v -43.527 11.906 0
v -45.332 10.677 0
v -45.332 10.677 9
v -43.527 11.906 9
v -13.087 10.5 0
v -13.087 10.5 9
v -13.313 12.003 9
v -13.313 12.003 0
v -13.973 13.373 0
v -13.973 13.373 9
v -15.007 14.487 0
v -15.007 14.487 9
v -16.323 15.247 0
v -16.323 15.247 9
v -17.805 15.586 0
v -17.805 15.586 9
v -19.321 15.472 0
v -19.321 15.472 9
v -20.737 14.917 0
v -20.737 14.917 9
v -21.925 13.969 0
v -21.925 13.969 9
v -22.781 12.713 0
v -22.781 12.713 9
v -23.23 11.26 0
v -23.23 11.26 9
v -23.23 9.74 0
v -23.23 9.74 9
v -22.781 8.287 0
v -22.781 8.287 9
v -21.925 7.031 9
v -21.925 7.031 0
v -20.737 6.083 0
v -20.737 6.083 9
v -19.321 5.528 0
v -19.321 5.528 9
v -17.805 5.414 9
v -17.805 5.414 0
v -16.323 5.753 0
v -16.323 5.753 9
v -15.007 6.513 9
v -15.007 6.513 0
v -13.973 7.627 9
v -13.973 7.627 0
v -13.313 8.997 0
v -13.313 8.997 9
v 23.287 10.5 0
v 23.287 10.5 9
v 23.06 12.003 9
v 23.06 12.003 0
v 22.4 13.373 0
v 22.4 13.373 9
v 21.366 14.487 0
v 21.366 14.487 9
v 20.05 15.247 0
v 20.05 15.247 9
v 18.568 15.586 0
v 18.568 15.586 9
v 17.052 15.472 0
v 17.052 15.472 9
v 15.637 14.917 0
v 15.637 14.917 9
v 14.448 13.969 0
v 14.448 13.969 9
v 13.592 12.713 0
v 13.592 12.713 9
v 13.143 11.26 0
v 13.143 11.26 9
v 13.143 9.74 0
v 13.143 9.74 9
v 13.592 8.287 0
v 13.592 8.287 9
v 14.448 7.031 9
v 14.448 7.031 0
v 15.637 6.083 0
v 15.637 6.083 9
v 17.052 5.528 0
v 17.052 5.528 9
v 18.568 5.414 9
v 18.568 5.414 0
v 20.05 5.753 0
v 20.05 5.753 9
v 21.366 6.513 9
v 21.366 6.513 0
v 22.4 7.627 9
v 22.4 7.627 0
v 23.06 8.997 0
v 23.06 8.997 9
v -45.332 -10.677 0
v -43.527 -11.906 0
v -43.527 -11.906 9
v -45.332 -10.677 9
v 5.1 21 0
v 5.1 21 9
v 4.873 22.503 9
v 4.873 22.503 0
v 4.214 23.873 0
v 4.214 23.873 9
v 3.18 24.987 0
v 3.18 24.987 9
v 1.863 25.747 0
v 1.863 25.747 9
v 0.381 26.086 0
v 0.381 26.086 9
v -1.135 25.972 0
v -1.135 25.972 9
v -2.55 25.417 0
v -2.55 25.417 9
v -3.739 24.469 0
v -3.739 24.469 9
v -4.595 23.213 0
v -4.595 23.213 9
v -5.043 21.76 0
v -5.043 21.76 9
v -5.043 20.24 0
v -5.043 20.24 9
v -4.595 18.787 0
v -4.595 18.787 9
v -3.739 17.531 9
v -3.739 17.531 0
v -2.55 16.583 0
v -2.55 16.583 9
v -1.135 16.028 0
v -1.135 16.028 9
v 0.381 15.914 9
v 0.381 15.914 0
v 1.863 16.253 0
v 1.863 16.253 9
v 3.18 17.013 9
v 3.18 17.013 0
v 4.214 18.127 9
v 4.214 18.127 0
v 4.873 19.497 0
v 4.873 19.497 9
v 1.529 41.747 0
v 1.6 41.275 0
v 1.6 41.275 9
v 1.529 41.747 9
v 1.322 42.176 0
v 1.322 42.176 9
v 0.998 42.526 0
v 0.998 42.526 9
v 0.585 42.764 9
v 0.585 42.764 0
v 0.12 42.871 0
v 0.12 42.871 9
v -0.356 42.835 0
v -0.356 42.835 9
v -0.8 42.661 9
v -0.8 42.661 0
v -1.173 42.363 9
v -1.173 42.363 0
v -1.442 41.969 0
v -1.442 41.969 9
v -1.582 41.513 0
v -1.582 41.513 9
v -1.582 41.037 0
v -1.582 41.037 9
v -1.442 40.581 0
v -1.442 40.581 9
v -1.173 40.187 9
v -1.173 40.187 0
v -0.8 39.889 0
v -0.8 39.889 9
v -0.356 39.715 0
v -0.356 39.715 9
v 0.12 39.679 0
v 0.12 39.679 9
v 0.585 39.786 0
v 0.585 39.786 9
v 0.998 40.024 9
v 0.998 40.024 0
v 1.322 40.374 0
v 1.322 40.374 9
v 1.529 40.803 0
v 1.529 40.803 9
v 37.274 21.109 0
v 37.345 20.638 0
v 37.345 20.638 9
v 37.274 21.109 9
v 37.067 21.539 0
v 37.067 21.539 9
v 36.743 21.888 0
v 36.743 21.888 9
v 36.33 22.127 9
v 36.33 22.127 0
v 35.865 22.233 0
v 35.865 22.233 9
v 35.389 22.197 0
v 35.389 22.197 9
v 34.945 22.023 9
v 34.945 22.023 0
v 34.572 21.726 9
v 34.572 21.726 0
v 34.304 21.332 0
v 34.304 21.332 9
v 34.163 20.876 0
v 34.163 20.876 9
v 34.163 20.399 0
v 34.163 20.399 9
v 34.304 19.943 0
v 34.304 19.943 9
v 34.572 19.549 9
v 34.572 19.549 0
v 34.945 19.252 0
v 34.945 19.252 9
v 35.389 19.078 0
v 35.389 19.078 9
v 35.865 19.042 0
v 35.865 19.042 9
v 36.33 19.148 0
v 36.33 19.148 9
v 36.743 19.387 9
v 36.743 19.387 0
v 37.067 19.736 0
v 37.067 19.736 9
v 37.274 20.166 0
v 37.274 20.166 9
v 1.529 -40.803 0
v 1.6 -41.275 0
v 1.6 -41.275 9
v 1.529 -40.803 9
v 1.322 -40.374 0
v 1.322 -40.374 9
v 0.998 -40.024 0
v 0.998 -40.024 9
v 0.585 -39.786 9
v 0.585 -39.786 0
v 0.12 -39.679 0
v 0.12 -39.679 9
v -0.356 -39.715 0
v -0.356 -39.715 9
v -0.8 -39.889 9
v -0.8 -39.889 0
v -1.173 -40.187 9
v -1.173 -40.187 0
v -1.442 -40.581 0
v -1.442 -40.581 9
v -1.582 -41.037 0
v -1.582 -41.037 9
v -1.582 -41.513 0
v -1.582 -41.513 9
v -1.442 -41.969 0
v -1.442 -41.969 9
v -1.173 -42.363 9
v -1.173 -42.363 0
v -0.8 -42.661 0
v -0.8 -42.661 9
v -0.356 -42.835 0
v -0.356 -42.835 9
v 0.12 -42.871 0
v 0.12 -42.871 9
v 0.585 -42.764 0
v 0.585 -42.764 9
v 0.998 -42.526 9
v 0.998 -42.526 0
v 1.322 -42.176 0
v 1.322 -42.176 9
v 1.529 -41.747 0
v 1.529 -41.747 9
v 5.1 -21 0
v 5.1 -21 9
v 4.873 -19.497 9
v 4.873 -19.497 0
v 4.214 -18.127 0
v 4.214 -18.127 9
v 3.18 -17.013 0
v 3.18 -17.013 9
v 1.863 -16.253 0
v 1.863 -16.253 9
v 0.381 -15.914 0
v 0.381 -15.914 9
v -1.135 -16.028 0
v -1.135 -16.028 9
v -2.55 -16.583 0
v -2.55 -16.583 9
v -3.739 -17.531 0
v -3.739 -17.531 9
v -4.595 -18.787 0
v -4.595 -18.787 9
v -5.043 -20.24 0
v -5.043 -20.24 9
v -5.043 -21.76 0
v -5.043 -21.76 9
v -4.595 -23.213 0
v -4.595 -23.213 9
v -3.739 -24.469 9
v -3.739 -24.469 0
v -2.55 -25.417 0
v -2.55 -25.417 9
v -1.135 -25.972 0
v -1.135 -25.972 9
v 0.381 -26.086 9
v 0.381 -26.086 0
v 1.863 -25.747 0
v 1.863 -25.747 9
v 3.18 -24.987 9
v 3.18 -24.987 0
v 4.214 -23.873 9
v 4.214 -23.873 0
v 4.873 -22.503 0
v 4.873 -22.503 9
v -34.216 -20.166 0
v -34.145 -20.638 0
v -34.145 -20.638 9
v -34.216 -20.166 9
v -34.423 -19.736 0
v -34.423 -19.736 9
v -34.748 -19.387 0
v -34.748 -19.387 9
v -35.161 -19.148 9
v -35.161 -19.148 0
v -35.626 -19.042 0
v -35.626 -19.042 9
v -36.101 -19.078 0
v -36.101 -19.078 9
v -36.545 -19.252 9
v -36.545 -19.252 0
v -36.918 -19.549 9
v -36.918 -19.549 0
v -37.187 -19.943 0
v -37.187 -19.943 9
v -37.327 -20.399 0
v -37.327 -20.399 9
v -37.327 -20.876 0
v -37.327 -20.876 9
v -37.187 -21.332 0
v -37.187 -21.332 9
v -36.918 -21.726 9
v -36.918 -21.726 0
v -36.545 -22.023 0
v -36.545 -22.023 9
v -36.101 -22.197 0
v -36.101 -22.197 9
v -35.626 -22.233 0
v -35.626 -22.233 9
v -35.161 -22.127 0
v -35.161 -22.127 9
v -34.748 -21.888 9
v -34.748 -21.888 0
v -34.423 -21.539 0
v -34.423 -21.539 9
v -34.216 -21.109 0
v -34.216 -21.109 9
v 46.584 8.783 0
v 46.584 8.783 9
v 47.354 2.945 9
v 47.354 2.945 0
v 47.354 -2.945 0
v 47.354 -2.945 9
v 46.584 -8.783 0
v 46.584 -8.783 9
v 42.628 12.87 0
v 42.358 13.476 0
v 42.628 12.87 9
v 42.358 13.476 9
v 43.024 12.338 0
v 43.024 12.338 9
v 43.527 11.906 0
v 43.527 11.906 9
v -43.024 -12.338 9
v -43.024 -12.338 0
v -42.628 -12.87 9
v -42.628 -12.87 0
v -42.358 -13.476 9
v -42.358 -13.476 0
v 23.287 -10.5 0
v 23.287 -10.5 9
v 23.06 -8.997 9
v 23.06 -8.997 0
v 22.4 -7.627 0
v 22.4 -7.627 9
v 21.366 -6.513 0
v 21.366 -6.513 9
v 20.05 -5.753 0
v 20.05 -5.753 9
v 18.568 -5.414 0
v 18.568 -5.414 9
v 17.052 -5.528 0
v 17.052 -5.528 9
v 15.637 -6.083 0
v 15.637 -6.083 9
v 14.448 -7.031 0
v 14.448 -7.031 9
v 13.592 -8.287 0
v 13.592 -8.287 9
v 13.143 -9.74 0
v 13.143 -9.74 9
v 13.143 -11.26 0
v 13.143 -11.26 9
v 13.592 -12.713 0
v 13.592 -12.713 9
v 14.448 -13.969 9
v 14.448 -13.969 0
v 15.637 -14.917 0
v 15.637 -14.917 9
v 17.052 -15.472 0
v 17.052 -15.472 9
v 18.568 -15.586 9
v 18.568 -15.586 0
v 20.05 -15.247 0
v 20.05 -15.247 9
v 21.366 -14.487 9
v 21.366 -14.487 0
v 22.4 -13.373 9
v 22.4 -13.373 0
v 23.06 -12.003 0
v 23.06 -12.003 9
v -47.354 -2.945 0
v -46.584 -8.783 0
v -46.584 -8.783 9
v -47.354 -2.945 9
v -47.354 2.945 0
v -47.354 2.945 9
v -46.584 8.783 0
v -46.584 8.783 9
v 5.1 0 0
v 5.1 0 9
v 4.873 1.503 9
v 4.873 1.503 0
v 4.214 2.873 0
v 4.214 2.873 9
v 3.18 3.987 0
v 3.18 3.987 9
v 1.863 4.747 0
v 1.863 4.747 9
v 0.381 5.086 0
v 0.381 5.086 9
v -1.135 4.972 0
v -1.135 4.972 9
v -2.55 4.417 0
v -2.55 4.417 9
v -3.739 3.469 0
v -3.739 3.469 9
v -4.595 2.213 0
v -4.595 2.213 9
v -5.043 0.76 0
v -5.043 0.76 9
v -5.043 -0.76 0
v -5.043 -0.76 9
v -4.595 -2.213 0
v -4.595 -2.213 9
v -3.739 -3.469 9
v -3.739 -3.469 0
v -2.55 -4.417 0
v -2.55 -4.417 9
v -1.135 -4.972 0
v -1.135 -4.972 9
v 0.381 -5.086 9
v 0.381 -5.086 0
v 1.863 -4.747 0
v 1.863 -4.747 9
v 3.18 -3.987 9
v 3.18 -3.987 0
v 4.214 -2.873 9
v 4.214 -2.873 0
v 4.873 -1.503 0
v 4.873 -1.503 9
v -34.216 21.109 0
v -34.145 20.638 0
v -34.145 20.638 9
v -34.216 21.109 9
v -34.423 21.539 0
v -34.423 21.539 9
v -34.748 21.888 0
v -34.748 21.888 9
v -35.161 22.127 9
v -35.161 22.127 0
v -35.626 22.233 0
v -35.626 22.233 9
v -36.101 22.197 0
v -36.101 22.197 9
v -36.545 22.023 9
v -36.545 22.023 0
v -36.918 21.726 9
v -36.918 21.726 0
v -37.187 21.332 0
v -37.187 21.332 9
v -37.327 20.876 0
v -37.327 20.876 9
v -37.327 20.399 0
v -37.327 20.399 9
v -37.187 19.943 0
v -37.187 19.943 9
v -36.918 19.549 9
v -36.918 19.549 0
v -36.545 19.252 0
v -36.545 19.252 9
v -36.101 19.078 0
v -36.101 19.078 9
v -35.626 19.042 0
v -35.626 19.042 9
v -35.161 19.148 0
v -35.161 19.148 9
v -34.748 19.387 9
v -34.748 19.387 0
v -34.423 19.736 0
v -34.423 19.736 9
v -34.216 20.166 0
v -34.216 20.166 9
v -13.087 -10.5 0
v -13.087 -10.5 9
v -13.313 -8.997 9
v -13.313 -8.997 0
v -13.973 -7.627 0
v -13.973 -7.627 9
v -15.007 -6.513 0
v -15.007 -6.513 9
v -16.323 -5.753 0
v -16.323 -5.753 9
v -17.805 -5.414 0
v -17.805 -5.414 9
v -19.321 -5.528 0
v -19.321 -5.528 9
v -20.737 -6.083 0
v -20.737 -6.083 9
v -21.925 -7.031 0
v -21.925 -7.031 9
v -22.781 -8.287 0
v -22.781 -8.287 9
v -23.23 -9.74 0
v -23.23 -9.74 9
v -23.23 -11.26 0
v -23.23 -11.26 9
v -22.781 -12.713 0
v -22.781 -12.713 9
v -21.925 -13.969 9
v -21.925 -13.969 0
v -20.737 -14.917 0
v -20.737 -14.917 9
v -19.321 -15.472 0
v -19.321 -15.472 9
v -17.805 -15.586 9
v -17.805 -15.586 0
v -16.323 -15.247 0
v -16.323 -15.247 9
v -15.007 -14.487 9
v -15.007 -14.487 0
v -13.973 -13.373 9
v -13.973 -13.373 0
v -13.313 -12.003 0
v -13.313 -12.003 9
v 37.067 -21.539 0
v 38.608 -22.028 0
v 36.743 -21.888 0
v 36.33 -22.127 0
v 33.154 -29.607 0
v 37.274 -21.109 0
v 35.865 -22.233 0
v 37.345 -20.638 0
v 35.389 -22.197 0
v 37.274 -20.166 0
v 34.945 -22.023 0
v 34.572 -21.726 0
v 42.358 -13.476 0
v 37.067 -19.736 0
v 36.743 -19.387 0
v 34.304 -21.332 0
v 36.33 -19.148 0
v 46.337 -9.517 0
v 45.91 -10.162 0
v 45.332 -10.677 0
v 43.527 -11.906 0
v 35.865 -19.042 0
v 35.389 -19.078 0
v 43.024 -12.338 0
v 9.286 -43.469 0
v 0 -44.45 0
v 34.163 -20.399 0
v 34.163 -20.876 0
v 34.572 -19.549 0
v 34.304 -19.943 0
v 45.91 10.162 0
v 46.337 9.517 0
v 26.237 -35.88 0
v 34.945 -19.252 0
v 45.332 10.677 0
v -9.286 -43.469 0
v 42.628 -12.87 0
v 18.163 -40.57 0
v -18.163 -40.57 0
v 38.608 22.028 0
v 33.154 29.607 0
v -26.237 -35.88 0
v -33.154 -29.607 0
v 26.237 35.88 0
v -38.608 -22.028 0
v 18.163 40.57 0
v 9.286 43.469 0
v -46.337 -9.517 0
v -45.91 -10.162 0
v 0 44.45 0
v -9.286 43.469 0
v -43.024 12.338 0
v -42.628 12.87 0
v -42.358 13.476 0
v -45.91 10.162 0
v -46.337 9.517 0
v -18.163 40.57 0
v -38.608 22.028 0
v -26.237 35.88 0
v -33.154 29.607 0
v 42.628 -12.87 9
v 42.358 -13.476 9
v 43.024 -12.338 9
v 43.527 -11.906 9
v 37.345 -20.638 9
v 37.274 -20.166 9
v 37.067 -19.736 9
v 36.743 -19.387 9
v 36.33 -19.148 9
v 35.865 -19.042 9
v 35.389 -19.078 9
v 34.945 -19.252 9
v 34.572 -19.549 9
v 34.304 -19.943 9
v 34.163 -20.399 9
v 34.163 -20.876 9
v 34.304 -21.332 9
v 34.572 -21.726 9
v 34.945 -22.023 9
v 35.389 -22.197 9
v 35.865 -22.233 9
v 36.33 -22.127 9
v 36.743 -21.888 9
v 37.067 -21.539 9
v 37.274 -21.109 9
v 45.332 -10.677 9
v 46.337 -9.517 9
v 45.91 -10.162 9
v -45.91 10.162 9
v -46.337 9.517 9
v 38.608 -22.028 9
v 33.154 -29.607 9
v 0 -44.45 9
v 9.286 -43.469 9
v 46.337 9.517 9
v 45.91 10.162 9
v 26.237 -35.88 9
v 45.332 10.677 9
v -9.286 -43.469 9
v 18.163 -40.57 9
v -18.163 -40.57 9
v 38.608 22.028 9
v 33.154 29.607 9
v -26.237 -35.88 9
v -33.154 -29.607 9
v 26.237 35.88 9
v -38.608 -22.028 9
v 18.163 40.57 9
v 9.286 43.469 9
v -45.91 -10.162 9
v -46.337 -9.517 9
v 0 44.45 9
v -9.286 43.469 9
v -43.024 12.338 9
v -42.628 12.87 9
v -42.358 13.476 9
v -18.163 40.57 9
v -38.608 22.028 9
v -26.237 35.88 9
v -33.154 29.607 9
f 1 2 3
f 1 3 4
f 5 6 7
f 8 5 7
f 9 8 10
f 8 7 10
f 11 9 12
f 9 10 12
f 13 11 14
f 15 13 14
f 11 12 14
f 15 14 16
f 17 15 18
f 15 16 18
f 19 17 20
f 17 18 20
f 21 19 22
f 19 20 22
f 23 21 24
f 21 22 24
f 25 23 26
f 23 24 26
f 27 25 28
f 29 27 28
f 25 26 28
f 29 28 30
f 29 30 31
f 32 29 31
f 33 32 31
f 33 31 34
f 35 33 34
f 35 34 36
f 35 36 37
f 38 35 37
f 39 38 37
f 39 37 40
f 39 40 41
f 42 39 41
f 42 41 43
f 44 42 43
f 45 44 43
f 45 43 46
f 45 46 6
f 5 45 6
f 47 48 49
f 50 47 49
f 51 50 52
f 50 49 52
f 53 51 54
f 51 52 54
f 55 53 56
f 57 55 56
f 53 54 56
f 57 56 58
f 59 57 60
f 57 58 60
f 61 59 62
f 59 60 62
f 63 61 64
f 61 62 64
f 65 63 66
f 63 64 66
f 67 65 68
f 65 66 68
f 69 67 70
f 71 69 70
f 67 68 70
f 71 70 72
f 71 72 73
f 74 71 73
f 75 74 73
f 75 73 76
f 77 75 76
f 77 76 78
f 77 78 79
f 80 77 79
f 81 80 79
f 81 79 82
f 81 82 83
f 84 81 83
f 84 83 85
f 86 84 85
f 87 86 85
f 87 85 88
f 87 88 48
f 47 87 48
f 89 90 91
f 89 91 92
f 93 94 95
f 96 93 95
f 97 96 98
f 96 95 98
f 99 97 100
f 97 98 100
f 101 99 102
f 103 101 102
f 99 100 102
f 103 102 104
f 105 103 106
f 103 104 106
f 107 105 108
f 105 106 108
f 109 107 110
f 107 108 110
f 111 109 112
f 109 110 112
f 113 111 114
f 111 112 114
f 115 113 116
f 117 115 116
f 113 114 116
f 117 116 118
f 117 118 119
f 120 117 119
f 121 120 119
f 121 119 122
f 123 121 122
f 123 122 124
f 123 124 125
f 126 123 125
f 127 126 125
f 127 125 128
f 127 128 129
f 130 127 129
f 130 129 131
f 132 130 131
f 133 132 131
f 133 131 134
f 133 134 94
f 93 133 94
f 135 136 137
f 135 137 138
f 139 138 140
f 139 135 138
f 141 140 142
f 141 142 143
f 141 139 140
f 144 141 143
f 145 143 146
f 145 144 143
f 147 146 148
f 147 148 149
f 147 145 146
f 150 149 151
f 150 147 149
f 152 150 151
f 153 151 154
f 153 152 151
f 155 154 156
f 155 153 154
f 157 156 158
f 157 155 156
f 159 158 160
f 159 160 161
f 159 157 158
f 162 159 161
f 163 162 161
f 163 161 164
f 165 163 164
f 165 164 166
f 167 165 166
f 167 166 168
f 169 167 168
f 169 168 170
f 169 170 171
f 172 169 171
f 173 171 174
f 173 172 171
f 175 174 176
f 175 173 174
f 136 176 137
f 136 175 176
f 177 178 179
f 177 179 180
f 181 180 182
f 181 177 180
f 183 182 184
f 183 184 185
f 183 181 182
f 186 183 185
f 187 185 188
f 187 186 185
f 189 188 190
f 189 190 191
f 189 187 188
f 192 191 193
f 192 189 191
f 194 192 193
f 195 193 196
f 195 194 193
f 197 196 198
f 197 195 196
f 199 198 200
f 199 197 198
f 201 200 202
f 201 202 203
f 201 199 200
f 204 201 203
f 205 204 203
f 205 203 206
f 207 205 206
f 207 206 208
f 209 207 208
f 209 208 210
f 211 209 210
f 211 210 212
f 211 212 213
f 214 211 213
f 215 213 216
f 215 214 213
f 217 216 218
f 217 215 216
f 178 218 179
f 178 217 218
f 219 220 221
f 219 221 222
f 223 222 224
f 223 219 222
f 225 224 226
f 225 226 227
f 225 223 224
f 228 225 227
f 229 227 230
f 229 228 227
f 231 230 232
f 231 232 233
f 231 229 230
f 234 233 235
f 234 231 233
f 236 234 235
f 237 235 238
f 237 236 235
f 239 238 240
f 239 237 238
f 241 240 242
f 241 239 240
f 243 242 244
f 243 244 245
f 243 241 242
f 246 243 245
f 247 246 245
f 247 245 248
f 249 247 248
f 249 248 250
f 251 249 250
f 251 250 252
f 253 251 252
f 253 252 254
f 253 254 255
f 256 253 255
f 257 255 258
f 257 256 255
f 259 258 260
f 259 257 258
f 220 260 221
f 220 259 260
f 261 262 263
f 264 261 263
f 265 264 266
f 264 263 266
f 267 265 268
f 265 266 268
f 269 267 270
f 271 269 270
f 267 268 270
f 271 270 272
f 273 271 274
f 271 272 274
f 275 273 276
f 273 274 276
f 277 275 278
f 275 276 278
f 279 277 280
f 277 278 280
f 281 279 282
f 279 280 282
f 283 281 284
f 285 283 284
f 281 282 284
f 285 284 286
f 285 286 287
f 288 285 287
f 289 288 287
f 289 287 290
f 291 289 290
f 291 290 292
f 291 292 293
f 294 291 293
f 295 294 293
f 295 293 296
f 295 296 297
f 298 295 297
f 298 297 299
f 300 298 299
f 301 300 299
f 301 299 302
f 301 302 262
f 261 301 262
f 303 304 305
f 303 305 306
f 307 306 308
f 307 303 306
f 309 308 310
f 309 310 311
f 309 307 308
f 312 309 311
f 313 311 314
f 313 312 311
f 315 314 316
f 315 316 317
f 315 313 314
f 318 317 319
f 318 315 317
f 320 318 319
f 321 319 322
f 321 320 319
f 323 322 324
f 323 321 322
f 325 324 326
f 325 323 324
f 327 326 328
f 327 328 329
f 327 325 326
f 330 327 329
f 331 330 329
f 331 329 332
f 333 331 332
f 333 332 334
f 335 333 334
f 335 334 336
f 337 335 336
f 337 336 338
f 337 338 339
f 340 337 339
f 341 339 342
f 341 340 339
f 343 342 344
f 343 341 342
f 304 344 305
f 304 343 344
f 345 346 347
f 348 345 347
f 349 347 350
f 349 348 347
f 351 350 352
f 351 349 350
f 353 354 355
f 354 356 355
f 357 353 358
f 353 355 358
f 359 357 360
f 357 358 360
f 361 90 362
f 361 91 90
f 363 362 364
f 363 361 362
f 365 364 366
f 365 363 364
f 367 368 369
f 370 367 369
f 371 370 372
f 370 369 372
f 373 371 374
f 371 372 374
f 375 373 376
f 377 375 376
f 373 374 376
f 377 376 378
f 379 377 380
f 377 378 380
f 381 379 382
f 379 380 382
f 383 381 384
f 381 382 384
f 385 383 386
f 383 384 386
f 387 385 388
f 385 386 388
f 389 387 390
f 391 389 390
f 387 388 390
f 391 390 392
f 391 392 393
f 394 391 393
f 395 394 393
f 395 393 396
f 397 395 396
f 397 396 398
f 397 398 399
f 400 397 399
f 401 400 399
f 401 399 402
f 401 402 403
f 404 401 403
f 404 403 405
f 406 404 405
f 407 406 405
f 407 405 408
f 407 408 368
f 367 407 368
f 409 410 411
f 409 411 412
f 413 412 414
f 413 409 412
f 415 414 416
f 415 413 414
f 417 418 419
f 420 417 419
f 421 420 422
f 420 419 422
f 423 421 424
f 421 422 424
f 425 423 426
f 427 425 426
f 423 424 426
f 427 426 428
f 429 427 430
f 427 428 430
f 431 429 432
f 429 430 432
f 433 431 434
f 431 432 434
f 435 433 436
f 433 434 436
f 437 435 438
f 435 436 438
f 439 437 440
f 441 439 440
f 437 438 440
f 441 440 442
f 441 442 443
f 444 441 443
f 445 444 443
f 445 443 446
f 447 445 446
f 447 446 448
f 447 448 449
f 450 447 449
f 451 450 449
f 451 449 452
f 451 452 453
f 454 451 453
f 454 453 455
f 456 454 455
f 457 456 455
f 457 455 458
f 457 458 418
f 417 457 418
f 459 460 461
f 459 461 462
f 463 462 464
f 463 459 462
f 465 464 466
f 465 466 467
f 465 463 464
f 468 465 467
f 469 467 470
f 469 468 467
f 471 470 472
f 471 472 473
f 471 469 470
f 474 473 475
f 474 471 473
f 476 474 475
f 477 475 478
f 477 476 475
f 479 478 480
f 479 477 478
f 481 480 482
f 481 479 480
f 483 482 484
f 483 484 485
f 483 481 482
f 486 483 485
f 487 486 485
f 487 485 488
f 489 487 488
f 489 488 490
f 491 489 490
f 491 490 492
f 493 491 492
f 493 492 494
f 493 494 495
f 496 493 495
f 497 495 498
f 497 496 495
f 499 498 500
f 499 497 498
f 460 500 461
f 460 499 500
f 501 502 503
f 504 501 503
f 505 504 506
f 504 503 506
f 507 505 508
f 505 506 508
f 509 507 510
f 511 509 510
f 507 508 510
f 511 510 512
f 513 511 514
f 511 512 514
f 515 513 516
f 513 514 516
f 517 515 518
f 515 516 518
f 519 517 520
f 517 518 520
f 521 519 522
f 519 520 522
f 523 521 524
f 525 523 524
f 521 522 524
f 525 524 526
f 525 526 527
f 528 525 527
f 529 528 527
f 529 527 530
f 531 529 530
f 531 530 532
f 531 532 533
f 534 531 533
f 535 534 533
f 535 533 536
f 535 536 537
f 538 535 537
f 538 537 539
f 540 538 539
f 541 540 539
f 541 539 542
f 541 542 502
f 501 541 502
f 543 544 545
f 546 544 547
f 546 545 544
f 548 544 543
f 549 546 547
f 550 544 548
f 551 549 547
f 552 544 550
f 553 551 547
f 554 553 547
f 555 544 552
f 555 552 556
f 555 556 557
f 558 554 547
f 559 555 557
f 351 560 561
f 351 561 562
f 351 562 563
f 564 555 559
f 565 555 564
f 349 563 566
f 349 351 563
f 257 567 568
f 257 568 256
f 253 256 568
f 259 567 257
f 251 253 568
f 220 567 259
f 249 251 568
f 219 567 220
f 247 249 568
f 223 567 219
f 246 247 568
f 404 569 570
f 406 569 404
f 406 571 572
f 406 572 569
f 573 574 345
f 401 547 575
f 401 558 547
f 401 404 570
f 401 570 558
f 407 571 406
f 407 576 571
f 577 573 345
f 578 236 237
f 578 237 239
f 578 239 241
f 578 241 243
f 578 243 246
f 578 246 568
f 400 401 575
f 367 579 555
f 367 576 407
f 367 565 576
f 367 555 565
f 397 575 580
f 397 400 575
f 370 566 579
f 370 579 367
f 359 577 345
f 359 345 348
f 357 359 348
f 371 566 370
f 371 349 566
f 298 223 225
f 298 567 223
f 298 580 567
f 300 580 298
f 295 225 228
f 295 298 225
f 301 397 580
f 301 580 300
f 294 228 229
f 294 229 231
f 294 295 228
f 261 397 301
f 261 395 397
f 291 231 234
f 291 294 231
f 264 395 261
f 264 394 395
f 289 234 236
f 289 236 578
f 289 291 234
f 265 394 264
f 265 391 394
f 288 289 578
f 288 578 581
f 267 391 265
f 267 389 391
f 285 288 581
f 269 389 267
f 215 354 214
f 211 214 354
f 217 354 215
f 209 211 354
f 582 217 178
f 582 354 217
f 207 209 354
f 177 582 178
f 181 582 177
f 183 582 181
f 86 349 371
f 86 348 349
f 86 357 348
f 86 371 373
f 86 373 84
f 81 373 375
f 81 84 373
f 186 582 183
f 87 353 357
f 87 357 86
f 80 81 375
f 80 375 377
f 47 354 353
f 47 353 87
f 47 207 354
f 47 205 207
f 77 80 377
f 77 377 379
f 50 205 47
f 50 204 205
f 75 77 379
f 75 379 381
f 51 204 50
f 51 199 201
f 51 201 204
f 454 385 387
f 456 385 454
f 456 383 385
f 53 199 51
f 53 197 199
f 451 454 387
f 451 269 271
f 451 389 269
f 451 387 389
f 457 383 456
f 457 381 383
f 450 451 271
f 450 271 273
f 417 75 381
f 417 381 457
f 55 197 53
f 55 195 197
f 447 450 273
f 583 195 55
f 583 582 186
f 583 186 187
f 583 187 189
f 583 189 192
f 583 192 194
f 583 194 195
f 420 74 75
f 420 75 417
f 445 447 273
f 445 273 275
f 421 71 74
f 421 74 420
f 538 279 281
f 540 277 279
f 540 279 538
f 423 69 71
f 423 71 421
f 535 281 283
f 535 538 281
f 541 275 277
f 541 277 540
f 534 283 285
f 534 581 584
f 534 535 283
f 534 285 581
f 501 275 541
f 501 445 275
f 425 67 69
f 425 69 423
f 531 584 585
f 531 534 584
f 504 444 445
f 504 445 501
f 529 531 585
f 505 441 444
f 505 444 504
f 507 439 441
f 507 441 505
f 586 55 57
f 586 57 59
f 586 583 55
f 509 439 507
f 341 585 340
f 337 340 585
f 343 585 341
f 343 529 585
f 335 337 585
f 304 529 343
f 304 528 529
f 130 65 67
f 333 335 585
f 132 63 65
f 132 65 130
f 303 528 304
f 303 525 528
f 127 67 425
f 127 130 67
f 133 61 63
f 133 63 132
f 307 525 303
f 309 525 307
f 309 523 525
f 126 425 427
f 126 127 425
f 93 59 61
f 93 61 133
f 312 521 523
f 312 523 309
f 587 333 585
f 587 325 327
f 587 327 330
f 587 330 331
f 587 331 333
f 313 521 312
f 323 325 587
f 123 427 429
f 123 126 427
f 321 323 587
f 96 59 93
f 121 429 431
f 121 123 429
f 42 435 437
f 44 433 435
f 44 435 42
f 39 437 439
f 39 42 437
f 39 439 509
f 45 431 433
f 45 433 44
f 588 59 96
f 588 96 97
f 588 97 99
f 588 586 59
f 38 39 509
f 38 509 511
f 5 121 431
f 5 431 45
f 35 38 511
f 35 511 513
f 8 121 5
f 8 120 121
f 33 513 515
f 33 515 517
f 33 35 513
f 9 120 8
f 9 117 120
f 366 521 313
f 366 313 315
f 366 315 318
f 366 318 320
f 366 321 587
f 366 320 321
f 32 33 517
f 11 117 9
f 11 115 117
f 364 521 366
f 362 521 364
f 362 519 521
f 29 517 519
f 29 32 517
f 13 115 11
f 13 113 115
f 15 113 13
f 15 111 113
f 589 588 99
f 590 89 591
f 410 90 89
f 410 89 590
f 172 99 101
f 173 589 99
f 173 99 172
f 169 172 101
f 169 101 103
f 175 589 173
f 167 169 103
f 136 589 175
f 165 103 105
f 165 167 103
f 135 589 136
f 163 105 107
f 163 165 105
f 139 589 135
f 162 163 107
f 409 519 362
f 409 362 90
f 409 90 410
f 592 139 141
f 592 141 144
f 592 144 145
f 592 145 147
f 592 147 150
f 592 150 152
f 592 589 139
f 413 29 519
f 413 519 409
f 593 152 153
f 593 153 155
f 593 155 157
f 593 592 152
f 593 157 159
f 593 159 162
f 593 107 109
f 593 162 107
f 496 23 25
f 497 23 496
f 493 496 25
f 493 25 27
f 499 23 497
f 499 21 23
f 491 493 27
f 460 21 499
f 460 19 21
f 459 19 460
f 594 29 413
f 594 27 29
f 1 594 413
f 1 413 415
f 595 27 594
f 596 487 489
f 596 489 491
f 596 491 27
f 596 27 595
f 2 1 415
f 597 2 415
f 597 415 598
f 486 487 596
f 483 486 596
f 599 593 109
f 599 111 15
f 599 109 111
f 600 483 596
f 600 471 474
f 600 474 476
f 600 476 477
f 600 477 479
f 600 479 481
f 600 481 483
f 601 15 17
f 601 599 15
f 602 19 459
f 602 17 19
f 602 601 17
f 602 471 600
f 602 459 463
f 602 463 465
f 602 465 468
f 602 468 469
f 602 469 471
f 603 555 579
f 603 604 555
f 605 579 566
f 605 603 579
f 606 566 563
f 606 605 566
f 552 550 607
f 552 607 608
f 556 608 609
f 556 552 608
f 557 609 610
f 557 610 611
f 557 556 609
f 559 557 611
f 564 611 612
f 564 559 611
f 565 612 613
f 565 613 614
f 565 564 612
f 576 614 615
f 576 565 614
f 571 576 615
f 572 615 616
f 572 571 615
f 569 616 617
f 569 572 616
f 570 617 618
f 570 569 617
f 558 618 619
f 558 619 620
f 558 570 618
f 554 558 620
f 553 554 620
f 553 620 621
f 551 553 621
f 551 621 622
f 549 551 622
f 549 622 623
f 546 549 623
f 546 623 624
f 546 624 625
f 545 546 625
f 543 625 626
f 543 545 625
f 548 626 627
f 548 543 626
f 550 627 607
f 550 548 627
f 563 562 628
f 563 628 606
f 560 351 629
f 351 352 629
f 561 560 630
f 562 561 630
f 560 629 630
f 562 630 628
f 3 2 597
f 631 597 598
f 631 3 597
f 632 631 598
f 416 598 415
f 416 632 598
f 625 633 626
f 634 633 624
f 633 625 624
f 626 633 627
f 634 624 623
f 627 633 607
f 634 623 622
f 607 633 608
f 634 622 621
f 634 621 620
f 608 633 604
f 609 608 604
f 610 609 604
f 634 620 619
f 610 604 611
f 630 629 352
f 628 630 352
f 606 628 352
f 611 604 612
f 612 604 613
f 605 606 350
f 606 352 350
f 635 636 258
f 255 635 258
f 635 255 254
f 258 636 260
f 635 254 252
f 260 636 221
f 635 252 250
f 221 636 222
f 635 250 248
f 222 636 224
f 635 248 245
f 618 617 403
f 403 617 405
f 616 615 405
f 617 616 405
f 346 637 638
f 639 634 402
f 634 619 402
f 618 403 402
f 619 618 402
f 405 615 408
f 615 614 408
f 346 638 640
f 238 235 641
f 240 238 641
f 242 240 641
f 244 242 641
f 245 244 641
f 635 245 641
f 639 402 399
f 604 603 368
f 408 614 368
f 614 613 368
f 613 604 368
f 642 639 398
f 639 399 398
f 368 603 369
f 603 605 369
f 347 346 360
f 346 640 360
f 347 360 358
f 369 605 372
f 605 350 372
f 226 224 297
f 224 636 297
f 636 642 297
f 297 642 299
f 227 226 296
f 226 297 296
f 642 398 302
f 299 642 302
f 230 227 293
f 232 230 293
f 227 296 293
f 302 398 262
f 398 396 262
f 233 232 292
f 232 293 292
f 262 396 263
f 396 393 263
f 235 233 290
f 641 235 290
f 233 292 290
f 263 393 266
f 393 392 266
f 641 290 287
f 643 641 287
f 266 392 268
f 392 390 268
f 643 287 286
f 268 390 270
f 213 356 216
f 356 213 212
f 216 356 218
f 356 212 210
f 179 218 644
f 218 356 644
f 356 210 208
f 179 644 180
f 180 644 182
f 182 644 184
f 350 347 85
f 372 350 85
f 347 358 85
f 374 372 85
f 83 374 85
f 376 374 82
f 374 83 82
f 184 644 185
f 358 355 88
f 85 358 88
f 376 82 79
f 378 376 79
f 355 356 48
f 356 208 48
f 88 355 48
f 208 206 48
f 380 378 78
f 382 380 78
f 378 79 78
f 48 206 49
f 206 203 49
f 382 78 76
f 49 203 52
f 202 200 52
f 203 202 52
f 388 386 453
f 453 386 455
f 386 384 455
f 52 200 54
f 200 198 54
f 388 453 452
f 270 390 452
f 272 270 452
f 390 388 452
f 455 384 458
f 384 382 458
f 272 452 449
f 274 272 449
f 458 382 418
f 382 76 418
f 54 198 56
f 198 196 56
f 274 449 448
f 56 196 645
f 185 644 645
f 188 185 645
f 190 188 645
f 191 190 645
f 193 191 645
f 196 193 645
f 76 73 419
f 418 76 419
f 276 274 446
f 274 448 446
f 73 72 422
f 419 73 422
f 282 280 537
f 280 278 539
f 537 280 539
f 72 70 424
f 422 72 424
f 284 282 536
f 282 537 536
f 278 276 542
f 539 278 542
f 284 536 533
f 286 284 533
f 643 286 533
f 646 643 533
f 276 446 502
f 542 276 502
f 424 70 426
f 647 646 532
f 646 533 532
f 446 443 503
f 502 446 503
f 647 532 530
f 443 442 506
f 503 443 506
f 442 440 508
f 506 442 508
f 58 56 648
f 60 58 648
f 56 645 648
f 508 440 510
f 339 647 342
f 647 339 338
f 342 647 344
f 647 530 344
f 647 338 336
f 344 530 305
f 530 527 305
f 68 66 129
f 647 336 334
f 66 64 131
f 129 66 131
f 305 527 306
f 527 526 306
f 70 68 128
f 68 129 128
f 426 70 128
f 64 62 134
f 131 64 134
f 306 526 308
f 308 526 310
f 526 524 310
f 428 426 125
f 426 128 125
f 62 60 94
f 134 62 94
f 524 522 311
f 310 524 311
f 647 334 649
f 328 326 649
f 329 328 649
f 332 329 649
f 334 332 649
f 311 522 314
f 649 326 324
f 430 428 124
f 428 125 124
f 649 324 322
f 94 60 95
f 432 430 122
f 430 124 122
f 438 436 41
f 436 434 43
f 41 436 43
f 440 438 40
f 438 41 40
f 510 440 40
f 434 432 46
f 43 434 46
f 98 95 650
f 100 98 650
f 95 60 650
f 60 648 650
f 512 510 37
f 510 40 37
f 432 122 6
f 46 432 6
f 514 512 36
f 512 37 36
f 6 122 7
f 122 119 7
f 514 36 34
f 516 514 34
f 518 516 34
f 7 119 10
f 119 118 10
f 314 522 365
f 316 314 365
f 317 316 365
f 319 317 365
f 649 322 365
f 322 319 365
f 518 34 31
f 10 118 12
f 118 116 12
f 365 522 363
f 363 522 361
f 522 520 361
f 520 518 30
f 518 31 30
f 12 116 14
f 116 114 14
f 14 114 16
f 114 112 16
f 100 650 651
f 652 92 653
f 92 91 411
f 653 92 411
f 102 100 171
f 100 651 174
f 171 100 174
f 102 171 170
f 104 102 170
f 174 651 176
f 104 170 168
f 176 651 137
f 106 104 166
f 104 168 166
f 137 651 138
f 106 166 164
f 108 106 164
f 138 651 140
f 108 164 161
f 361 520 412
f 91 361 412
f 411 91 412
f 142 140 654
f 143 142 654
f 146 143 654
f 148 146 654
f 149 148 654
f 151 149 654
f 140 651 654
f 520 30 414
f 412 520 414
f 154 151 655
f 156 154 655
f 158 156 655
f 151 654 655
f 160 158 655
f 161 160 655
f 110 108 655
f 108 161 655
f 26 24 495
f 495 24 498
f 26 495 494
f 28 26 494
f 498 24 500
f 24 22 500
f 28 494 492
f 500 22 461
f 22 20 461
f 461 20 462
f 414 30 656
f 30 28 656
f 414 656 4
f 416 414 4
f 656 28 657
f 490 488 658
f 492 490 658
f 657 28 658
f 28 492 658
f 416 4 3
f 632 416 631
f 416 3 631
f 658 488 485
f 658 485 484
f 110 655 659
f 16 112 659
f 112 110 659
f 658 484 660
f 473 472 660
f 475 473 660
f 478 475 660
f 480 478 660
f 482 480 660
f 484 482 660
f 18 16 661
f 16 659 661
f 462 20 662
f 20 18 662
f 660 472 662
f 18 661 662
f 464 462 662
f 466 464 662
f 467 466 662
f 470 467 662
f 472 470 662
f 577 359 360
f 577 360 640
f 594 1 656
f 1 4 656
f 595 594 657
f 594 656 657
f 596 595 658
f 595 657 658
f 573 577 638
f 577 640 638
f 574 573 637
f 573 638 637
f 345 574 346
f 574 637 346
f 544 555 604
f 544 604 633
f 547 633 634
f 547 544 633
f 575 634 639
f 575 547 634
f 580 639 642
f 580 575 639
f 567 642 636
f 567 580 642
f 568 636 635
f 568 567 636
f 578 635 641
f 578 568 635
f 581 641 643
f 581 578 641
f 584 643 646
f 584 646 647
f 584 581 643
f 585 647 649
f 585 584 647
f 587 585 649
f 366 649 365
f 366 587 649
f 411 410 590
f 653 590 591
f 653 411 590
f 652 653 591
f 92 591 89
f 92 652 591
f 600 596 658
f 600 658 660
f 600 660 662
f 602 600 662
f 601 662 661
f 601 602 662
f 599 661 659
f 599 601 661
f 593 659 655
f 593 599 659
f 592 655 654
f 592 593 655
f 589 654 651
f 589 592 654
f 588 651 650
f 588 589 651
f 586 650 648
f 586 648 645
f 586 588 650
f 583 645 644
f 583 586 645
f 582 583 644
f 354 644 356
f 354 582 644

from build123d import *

# Parameters (mm, degrees)
SKETCH1_R           = 1.6
BOSS_EXTRUDE1_DEPTH = 9
FILLET1_R           = 3
SKETCH2_R           = 5.1
CUT_EXTRUDE1_DEPTH  = 10


with BuildPart() as part:
    # Sketch1 → Boss-Extrude1 (new body)
    with BuildSketch(Plane.XY):
        with BuildLine():
            Line((-46.324821937, 10), (-42.656212912, 12.5))
            ThreePointArc((-42.656212912, 12.5), (0, 44.45), (42.656212912, 12.5))
            Line((42.656212912, 12.5), (46.324821937, 10))
            ThreePointArc((46.324821937, 10), (47.45, 0), (46.324821937, -10))
            Line((46.324821937, -10), (42.656212912, -12.5))
            ThreePointArc((42.656212912, -12.5), (0, -44.45), (-42.656212912, -12.5))
            Line((-42.656212912, -12.5), (-46.324821937, -10))
            ThreePointArc((-46.324821937, -10), (-47.45, 0), (-46.324821937, 10))
        make_face()
        with Locations((0, 41.275)):
            Circle(SKETCH1_R, mode=Mode.SUBTRACT)
        with Locations((35.745198541, 20.6375)):
            Circle(SKETCH1_R, mode=Mode.SUBTRACT)
        with Locations((35.745198541, -20.6375)):
            Circle(SKETCH1_R, mode=Mode.SUBTRACT)
        with Locations((0, -41.275)):
            Circle(SKETCH1_R, mode=Mode.SUBTRACT)
        with Locations((-35.745198541, -20.6375)):
            Circle(SKETCH1_R, mode=Mode.SUBTRACT)
        with Locations((-35.745198541, 20.6375)):
            Circle(SKETCH1_R, mode=Mode.SUBTRACT)
    extrude(amount=BOSS_EXTRUDE1_DEPTH)

    # Fillet1
    fillet1_edges = [part.edges().sort_by_distance(p)[0] for p in [
        (46.324821937, -10, 4.5),
        (42.656212912, -12.5, 4.5),
        (-42.656212912, -12.5, 4.5),
        (-46.324821937, -10, 4.5),
        (-46.324821937, 10, 4.5),
        (-42.656212912, 12.5, 4.5),
        (42.656212912, 12.5, 4.5),
        (46.324821937, 10, 4.5),
    ]]
    fillet(fillet1_edges, radius=FILLET1_R)

    # Sketch2 → Cut-Extrude1 (cut, through all)
    with BuildSketch(Plane.XY.offset(9)):
        with Locations((0, 21)):
            Circle(SKETCH2_R)
        with Locations((18.186533479, 10.5)):
            Circle(SKETCH2_R)
        with Locations((18.186533479, -10.5)):
            Circle(SKETCH2_R)
        with Locations((0, -21)):
            Circle(SKETCH2_R)
        with Locations((-18.186533479, -10.5)):
            Circle(SKETCH2_R)
        with Locations((-18.186533479, 10.5)):
            Circle(SKETCH2_R)
        Circle(SKETCH2_R)
    extrude(amount=-CUT_EXTRUDE1_DEPTH, mode=Mode.SUBTRACT)


solid = part.part
